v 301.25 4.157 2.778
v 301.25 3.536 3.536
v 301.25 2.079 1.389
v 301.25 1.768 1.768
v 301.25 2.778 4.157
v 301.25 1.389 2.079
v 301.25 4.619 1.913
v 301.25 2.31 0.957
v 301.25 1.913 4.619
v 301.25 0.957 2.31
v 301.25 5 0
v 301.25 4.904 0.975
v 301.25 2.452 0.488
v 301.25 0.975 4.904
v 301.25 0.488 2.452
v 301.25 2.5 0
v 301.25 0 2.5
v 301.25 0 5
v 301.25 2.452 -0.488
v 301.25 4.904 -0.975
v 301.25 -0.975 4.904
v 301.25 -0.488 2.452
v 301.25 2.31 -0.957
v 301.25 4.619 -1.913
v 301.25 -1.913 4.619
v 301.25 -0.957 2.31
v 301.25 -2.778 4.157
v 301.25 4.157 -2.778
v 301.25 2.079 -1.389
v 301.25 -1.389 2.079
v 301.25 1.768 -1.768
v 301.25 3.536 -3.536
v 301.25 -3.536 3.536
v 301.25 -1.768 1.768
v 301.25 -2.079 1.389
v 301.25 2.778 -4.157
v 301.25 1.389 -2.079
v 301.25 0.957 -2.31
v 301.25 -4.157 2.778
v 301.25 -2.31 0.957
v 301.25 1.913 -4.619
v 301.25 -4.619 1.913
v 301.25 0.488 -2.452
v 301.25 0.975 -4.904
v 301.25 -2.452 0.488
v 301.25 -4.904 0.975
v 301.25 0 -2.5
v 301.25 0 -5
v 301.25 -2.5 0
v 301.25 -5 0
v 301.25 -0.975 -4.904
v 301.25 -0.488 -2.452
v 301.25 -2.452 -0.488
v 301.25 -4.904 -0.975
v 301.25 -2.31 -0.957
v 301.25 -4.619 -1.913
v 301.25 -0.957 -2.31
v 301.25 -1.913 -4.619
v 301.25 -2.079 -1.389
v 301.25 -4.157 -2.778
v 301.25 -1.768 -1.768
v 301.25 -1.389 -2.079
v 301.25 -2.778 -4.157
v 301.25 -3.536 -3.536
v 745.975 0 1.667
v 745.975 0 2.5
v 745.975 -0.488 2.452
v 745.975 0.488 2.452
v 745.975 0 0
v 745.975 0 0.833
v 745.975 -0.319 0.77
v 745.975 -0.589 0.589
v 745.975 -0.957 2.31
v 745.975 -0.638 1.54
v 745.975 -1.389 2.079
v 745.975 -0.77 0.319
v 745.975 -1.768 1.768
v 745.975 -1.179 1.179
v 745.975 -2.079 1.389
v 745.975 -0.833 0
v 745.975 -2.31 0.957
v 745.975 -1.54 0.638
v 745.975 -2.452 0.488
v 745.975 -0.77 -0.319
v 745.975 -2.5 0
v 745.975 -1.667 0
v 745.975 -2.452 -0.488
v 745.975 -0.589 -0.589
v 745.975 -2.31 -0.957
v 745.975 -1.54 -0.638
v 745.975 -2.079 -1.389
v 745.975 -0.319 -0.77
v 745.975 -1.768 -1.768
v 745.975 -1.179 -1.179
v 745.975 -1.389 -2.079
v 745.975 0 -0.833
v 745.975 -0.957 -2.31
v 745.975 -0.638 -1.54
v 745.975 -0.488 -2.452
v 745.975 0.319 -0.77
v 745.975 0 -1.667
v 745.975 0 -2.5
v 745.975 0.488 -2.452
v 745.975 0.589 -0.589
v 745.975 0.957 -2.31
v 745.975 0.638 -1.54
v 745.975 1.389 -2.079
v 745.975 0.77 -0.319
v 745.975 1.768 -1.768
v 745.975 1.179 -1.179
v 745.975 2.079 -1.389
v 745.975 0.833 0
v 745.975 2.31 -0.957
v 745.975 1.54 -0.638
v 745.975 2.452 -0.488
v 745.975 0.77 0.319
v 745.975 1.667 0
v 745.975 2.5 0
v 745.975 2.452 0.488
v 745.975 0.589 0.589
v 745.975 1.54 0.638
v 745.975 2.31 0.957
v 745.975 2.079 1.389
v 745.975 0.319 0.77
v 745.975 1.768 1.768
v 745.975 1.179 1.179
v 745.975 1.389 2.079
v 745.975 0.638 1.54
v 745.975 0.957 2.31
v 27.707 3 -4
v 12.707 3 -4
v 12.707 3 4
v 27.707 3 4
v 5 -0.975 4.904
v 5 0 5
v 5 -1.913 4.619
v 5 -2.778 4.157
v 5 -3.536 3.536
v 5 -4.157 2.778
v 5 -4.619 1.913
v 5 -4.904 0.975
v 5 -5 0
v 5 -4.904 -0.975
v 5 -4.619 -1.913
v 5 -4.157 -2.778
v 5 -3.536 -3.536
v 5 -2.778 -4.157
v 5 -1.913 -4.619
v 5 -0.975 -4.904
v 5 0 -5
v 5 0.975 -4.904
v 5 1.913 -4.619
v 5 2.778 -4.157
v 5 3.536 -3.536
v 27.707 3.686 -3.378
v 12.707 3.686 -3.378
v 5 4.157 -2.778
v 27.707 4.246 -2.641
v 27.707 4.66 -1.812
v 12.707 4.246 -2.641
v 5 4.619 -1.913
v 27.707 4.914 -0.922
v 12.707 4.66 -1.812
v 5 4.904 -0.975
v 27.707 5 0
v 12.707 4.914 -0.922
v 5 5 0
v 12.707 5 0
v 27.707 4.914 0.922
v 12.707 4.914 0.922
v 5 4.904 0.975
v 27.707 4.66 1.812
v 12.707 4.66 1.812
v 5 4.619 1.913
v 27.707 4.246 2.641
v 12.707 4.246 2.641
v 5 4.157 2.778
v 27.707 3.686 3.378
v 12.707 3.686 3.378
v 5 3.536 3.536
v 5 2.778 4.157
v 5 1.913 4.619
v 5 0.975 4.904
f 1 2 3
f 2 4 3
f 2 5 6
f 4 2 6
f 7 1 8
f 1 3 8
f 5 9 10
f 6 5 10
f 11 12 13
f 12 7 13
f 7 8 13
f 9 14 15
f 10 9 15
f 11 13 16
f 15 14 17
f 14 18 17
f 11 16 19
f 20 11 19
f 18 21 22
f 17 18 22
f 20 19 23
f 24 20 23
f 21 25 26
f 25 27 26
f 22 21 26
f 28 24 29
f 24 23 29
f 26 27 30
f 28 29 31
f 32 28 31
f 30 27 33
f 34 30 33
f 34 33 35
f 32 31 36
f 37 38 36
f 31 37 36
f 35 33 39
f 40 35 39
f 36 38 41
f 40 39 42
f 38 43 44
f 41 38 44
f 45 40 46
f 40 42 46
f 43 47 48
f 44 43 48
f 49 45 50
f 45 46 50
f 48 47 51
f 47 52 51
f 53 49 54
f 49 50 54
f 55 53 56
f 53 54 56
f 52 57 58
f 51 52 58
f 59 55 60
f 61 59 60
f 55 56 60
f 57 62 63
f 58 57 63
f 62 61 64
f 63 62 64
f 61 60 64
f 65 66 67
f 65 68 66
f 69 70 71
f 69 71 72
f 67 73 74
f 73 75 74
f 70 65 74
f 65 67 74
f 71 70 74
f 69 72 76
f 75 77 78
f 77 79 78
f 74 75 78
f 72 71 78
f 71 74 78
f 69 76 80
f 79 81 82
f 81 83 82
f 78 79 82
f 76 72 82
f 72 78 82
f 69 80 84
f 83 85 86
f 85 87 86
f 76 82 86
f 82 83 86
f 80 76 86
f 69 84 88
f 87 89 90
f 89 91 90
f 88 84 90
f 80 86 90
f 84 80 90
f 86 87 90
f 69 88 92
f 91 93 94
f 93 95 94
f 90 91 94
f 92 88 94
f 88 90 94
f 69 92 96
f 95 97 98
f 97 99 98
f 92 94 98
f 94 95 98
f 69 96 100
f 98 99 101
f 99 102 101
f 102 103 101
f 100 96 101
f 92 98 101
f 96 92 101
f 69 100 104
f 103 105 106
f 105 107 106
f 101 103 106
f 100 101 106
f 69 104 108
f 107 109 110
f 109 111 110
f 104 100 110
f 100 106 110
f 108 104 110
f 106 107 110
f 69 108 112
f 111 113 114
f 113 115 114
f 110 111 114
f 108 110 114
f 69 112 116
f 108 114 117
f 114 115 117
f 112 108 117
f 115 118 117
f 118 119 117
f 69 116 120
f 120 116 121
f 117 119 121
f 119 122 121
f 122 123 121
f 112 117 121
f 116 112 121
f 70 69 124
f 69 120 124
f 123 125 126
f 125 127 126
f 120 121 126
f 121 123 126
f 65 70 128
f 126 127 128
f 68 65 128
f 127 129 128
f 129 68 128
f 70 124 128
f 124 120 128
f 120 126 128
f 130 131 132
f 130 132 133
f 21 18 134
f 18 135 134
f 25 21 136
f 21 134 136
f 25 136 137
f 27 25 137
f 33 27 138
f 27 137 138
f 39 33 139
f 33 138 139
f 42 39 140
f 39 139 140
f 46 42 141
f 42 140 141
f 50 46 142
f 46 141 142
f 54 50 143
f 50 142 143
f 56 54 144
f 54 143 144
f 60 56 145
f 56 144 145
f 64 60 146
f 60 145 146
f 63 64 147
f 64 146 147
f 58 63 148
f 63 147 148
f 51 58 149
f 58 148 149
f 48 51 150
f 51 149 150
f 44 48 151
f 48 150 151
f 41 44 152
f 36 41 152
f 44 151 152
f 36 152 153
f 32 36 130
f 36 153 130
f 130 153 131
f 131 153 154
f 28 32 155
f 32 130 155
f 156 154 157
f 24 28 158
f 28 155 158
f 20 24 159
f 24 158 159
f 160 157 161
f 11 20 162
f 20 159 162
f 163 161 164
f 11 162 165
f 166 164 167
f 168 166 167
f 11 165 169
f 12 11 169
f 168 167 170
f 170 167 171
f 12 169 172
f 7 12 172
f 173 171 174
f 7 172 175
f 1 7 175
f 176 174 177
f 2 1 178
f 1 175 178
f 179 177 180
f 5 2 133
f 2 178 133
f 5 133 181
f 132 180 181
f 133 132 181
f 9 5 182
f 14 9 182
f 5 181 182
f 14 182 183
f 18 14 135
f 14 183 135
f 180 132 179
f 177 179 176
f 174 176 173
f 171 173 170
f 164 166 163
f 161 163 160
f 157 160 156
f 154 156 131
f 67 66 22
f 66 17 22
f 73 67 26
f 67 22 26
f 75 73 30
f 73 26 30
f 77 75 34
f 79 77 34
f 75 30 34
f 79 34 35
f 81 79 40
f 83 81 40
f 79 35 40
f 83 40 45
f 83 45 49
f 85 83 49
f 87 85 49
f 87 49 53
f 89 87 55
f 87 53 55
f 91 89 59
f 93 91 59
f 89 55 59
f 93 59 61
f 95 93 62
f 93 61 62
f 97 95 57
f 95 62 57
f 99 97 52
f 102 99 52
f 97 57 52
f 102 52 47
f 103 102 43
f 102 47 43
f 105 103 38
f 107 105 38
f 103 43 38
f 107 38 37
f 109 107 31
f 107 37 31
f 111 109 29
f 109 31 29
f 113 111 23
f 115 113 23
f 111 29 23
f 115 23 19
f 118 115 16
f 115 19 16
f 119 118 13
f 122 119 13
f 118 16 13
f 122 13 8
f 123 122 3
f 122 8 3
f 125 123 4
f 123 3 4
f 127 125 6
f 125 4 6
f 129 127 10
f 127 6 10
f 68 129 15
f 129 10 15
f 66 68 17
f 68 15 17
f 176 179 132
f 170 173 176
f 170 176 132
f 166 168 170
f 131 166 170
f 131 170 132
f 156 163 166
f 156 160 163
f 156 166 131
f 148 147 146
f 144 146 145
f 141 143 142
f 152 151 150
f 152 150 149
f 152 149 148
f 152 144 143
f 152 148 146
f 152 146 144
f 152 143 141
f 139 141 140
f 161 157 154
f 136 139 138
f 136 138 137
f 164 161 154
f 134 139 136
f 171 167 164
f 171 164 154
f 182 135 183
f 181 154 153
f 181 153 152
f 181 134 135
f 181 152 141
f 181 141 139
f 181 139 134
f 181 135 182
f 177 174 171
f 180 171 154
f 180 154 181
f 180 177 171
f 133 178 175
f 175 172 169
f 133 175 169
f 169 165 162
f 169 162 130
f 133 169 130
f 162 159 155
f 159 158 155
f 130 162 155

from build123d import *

# Parameters (mm, degrees)
SKICA2_R                 = 5
ODEBRAT_VYSUNUT_M1_DEPTH = 5
SKICA3_W                 = 15
SKICA3_H                 = 10
ODEBRAT_VYSUNUT_M2_DEPTH = 16


with BuildPart() as part:
    # Skica1 → Rotovat3 (revolve)
    with BuildSketch(Plane.XY, mode=Mode.PRIVATE) as rotovat3_sk:
        Polygon((301.25, 5), (0, 5), (0, 0), (745.975022487, 0), (745.975001326, 2.5), (301.25, 2.5), align=None)
    revolve(rotovat3_sk.sketch.rotate(Axis((256.066983307, 0, 0), (1, 0, 0)), 90), axis=Axis((256.066983307, 0, 0), (1, 0, 0)))

    # Skica2 → Odebrat vysunutím1 (cut)
    with BuildSketch(Plane.ZY):
        Circle(SKICA2_R)
    extrude(amount=-ODEBRAT_VYSUNUT_M1_DEPTH, mode=Mode.SUBTRACT)

    # Skica3 → Odebrat vysunutím2 (cut)
    with BuildSketch(Plane(origin=(0, 19, 0), x_dir=(1, 0, 0), z_dir=(0, 1, 0))):
        with Locations((20.207259422, 0)):
            Rectangle(SKICA3_W, SKICA3_H)
    extrude(amount=-ODEBRAT_VYSUNUT_M2_DEPTH, mode=Mode.SUBTRACT)


solid = part.part
